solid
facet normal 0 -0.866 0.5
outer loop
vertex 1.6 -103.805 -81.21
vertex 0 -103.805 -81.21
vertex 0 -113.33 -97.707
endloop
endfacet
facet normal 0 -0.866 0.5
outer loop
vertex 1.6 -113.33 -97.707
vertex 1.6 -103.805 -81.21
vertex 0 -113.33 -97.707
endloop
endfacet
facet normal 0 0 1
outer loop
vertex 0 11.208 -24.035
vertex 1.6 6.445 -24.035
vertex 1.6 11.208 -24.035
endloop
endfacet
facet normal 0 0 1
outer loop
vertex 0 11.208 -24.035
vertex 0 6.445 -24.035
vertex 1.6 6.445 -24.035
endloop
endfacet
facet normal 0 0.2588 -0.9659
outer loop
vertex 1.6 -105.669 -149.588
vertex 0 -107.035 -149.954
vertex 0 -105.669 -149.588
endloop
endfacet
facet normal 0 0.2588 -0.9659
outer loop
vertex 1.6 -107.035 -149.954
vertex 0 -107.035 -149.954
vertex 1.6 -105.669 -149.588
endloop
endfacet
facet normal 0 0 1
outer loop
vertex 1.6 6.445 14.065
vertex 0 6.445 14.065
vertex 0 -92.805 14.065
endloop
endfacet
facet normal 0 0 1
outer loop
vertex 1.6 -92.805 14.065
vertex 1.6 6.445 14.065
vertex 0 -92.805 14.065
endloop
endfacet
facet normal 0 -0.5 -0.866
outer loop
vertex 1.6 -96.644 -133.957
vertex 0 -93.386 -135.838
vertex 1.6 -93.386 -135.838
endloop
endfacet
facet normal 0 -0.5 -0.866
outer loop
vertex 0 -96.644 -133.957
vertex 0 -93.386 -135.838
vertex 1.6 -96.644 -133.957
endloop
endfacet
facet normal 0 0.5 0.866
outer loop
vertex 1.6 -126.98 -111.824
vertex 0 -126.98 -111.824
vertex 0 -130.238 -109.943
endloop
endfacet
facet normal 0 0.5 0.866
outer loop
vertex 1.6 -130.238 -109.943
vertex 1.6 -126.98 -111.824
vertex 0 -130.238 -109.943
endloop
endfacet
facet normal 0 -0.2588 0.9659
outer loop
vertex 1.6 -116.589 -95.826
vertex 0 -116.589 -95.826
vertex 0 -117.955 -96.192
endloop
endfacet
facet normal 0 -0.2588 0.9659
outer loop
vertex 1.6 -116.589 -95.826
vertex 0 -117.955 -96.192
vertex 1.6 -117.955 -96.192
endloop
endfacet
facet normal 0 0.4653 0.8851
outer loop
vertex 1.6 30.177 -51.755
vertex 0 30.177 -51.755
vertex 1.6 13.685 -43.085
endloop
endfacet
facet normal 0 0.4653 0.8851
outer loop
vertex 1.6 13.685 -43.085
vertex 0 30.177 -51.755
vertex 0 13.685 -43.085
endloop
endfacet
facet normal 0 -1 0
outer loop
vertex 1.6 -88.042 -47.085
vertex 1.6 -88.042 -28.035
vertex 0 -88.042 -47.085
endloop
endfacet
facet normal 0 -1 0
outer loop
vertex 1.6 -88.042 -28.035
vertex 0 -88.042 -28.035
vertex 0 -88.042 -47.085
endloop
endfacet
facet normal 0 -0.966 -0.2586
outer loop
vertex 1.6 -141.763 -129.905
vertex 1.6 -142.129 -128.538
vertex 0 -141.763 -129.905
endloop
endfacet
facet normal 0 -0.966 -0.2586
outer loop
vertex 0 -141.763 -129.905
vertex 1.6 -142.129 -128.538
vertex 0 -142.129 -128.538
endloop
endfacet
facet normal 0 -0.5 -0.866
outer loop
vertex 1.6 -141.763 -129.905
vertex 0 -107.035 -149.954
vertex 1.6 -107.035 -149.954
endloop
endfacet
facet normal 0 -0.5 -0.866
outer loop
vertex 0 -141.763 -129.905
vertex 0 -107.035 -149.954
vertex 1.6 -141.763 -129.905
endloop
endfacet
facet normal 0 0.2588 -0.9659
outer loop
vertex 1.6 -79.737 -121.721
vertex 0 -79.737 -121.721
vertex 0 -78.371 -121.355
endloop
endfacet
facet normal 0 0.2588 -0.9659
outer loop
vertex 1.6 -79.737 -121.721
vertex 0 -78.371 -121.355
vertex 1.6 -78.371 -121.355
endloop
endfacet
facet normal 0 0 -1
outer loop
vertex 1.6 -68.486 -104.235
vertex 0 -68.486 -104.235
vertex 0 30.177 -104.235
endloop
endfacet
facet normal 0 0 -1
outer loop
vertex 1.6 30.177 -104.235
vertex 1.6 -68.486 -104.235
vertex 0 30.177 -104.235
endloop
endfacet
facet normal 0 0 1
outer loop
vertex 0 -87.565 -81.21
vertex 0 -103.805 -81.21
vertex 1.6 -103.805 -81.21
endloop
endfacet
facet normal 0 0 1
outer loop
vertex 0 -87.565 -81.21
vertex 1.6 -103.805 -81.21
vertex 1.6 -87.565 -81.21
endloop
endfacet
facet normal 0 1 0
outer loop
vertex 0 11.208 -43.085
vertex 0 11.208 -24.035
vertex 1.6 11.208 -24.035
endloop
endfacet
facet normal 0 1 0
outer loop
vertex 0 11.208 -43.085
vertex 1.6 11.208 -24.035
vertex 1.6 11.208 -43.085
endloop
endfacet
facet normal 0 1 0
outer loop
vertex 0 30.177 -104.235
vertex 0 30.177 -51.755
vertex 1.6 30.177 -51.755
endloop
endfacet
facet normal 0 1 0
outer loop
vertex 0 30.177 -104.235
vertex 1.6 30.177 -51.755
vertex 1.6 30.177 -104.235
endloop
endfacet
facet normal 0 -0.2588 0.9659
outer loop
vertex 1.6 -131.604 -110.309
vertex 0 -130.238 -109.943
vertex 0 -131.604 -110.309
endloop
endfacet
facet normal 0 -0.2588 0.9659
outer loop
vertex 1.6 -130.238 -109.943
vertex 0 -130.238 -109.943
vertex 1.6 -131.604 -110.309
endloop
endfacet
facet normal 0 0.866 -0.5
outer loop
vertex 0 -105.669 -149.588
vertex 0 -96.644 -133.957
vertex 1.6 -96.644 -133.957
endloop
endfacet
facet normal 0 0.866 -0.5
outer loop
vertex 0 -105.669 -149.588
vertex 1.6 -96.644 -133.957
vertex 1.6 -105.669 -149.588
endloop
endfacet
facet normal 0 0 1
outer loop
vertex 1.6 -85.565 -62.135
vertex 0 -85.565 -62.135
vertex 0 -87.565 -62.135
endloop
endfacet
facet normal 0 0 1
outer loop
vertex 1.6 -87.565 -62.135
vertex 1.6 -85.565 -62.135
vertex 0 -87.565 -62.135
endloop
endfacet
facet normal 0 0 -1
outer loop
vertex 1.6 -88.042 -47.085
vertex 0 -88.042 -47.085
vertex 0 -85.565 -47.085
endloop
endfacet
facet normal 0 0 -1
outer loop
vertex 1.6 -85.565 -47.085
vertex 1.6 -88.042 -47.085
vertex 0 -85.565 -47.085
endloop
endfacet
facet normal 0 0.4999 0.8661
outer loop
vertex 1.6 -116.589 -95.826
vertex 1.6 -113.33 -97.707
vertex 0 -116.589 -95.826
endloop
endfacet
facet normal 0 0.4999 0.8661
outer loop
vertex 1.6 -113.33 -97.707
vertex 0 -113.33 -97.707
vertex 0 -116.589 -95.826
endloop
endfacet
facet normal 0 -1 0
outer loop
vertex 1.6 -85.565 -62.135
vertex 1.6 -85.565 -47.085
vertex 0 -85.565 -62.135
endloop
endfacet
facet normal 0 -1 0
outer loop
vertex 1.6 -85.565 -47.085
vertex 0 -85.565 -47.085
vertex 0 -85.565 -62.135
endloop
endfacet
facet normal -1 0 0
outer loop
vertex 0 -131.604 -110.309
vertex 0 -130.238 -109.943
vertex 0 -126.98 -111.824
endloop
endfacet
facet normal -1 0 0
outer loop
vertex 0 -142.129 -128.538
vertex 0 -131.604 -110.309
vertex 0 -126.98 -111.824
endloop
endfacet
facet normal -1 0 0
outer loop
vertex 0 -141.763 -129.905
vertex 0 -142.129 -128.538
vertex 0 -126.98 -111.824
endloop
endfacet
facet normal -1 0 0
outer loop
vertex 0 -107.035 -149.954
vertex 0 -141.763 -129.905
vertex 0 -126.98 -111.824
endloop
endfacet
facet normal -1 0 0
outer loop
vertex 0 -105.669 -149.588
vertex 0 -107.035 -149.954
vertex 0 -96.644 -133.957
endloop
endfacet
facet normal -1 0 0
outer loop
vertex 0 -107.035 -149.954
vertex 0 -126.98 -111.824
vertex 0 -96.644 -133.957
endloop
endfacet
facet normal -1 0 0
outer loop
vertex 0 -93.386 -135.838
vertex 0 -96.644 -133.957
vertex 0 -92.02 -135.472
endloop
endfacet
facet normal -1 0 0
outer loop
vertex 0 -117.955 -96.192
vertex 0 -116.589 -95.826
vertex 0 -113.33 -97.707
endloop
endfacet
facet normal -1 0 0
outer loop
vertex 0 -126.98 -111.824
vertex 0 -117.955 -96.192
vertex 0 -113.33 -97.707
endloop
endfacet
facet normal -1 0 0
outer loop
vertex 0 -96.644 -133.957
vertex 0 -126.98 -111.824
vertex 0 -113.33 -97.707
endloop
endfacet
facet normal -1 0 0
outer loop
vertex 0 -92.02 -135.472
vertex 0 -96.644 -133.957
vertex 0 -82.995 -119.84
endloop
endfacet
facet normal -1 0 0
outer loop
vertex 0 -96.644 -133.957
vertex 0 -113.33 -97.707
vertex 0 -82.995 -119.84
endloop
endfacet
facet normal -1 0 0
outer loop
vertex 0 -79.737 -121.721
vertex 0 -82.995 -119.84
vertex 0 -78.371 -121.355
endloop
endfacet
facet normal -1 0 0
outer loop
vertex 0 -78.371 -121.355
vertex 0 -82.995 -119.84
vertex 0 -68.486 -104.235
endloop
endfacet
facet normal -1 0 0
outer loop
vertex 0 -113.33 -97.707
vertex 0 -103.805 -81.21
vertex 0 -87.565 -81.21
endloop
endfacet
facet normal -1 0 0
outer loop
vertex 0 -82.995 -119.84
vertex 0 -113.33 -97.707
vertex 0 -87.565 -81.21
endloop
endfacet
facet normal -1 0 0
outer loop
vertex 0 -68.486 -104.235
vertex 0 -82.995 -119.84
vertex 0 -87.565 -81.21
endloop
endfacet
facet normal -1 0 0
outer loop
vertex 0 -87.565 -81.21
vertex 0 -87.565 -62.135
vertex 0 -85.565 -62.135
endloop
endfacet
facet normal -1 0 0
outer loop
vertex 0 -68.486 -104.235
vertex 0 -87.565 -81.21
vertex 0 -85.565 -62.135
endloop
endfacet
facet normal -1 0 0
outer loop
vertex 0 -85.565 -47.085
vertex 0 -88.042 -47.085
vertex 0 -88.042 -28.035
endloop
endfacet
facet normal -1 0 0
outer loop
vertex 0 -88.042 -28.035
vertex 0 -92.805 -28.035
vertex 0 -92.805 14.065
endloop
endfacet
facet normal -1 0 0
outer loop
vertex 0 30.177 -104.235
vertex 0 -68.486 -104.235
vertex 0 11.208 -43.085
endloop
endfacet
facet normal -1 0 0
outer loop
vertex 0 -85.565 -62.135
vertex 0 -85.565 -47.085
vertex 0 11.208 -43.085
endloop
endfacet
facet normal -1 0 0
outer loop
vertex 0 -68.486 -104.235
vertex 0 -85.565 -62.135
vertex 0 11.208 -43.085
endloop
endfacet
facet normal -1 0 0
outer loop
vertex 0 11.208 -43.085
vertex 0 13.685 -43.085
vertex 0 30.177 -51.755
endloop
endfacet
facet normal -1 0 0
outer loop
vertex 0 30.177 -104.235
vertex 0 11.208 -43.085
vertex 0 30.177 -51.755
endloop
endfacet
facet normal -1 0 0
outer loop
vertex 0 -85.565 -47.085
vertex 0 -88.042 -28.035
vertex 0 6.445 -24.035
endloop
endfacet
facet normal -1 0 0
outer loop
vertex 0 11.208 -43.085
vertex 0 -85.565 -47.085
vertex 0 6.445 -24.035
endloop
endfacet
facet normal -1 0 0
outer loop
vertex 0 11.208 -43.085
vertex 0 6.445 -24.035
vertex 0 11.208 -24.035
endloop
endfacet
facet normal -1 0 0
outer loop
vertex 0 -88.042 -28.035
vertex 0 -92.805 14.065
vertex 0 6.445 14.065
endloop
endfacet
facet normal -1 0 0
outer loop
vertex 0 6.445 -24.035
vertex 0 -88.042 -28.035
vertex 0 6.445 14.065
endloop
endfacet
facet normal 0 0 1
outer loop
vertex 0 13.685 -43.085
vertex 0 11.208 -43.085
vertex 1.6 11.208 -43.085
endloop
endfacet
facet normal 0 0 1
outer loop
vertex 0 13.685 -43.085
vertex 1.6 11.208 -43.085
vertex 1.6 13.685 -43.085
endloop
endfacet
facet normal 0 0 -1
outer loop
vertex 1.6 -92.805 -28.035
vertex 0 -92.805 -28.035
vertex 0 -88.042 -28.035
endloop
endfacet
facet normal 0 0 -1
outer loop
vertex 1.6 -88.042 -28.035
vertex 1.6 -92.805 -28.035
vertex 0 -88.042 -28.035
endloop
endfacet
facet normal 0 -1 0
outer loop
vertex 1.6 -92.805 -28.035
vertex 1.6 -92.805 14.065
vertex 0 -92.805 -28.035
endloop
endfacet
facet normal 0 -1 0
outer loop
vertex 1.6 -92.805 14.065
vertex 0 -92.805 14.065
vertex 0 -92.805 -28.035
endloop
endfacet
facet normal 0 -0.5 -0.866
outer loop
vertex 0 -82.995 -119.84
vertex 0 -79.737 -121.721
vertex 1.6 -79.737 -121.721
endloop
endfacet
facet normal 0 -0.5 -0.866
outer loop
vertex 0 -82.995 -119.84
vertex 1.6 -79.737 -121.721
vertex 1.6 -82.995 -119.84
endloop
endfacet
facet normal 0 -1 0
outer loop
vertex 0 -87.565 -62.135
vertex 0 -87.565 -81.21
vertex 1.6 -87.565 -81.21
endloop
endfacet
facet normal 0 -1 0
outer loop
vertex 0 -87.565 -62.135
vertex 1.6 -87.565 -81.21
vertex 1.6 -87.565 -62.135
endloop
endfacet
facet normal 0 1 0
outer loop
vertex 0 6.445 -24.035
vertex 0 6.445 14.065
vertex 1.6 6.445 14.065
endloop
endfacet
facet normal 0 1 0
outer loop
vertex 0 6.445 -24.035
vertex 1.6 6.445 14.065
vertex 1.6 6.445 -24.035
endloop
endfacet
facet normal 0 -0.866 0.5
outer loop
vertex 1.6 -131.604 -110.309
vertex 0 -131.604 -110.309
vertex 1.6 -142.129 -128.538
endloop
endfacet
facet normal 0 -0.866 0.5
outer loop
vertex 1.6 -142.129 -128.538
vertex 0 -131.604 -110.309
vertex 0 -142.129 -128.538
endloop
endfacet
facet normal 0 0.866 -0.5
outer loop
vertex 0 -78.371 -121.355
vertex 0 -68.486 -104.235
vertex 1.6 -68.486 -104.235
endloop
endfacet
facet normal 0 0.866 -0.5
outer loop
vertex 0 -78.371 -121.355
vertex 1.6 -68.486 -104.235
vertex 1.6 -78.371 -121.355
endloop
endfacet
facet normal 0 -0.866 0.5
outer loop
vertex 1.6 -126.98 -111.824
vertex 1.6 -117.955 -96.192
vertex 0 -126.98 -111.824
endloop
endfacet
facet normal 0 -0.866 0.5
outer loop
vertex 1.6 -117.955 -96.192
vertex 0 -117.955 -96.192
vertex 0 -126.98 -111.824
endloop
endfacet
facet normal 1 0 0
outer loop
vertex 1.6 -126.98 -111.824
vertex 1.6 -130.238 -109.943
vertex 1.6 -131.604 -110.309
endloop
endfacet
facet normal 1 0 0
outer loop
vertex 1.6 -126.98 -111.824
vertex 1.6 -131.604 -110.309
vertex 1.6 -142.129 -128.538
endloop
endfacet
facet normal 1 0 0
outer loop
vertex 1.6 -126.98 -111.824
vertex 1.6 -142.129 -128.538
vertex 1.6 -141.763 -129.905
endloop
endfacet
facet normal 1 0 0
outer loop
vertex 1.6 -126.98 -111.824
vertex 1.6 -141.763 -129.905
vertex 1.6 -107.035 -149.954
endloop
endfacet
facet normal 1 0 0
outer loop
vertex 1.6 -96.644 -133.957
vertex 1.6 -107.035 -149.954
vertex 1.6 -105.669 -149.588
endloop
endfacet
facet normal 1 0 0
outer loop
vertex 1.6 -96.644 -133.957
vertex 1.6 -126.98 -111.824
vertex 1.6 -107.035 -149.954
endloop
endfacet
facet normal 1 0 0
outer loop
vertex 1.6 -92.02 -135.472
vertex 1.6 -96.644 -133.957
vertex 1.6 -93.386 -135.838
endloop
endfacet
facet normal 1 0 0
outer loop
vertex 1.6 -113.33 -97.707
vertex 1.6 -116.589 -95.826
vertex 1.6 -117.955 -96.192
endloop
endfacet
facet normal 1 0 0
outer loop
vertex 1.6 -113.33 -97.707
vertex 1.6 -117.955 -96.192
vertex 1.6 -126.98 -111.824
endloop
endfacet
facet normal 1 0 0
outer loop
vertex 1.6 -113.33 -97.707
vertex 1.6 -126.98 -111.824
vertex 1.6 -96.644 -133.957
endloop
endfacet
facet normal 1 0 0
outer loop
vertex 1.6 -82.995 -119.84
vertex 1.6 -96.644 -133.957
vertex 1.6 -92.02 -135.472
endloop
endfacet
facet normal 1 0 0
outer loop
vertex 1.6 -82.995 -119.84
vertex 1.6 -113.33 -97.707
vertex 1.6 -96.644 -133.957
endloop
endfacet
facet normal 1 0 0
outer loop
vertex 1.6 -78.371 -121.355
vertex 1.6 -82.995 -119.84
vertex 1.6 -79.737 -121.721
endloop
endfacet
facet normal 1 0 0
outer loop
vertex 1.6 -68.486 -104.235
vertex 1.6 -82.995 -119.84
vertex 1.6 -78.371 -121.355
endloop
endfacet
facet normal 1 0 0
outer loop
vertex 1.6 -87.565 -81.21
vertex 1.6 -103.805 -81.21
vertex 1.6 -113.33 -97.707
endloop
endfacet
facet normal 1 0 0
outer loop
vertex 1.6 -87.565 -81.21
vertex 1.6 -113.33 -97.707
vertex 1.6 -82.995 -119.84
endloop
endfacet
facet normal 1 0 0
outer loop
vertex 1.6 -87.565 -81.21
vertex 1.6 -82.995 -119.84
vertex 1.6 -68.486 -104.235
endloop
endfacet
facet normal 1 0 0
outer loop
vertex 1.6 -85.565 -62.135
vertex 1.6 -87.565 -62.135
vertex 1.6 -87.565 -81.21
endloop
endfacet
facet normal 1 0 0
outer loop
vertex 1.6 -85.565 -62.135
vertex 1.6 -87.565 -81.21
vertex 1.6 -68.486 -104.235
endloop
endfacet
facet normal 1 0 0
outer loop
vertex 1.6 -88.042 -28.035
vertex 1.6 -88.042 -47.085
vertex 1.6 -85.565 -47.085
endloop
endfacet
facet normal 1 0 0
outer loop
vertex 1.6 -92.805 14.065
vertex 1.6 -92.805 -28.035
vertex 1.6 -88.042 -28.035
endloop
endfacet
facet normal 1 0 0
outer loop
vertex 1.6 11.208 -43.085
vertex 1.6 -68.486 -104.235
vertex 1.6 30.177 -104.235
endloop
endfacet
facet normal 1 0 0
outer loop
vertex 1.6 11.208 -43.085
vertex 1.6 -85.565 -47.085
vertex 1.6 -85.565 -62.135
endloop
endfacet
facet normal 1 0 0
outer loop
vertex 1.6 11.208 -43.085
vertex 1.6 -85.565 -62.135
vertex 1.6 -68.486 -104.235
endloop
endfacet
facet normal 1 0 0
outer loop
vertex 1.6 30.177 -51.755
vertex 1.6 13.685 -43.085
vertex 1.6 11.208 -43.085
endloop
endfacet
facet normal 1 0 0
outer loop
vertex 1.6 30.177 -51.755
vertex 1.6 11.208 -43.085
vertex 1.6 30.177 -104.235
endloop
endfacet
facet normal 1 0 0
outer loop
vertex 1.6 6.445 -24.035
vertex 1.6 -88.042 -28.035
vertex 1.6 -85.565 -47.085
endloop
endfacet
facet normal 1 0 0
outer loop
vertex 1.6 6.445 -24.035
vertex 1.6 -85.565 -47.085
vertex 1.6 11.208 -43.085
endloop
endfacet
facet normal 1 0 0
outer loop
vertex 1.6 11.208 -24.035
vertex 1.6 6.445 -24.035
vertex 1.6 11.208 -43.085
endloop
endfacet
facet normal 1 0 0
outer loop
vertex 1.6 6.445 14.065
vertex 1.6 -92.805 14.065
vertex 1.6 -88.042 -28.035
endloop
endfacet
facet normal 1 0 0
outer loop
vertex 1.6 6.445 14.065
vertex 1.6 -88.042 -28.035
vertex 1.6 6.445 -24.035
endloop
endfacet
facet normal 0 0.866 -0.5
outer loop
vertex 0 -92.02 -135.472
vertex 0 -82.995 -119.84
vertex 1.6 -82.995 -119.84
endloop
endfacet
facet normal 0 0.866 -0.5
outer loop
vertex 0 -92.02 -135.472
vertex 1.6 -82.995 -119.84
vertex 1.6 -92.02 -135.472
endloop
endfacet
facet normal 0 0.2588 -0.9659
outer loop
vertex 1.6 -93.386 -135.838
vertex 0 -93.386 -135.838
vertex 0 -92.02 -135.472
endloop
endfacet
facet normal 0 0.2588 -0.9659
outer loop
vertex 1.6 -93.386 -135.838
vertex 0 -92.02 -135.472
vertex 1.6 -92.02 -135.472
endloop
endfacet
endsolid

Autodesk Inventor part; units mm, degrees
ref_plane "YZ Plane" through (0, 0, 0) normal (1, 0, 0) x (0, 1, 0)
ref_plane "XZ Plane" through (0, 0, 0) normal (0, 1, 0) x (-1, 0, 0)
ref_plane "XY Plane" through (0, 0, 0) normal (0, 0, 1) x (1, 0, 0)
sketch "Key" plane through (0, 0, 0) normal (0, 0, 1) x (1, 0, 0)
  line L0 (-9.525, 9.525) -> (9.525, 9.525) construction
  line L1 (9.525, 9.525) -> (9.525, -9.525) construction
  line L2 (9.525, -9.525) -> (-9.525, -9.525) construction
  line L3 (-9.525, -9.525) -> (-9.525, 9.525) construction
  line L4 (-9.525, 9.525) -> (9.525, -9.525) construction
  line L5 (9.525, 9.525) -> (-9.525, -9.525) construction
  point P0 (0, 0)
  point P1 (0, 0)
  dimension "d6" = 19.05
  dimension "d7" = 19.05
sketch "Col5" plane through (0, 0, 0) normal (0, 0, 1) x (1, 0, 0)
  point P0 (-10.8651, 0)
sketch "Col4" plane through (0, 0, 0) normal (0, 0, 1) x (1, 0, 0)
  point P0 (-10.8651, 0)
sketch "TC" plane through (0, 0, 0) normal (0, 0, 1) x (1, 0, 0)
  point P0 (-22.1335, 152.0917)
  dimension "d12" = 4.7625
  dimension "d13" = 4.7625
  dimension "d14" = 19.6363
sketch "Esquisse1" plane through (0, 0, 0) normal (1, 0, 0) x (0, 1, 0)
  line L0 (28.177, -71.755) -> (10.397, -71.755) construction
  line L1 (10.397, -71.755) -> (10.397, -102.235) construction
  line L2 (10.397, -102.235) -> (28.177, -102.235)
  line L3 (28.177, -102.235) -> (28.177, -71.755) construction
  line L4 (28.177, -71.755) -> (10.397, -102.235) construction
  line L5 (10.397, -71.755) -> (28.177, -102.235) construction
  line L6 (6.445, 14.065) -> (-92.805, 14.065)
  line L7 (6.445, 14.065) -> (6.445, -24.035)
  line L8 (-68.4861, -104.235) -> (30.177, -104.235)
  line L9 (30.177, -51.755) -> (30.177, -104.235)
  line L10 (-106.1694, -150.4545) -> (-142.6291, -129.4045)
  line L11 (-103.8052, -81.2096) -> (-113.3302, -97.7073)
  line L12 (-113.3302, -97.7073) -> (-117.4547, -95.3261)
  line L13 (-117.4547, -95.3261) -> (-126.9797, -111.8239)
  line L14 (-126.9797, -111.8239) -> (-131.1041, -109.4426)
  line L15 (-131.1041, -109.4426) -> (-142.6291, -129.4045)
  line L16 (-68.4861, -104.235) -> (-78.8706, -122.2214)
  line L17 (-78.8706, -122.2214) -> (-82.995, -119.8402)
  line L18 (-82.995, -119.8402) -> (-92.52, -136.338)
  line L19 (-92.52, -136.338) -> (-96.6444, -133.9567)
  line L20 (-96.6444, -133.9567) -> (-106.1694, -150.4545)
  line L21 (-92.805, 14.065) -> (-92.805, -28.035)
  line L22 (-92.805, -28.035) -> (-88.042, -28.035)
  line L23 (-88.042, -28.035) -> (-88.042, -47.085)
  line L24 (-88.042, -47.085) -> (-85.565, -47.085)
  line L25 (-85.565, -47.085) -> (-85.565, -62.135)
  line L26 (-85.565, -62.135) -> (-87.565, -62.135)
  line L27 (-89.5164, -89.4592) -> (-103.8052, -81.2096) construction
  line L28 (6.445, -24.035) -> (11.208, -24.035)
  line L29 (11.208, -24.035) -> (11.208, -43.085)
  line L30 (11.208, -43.085) -> (13.685, -43.085)
  line L31 (30.177, -51.755) -> (13.685, -43.085)
  line L32 (-78.8706, -122.2214) -> (-92.52, -136.338) construction
  line L33 (-92.52, -136.338) -> (-106.1694, -150.4545) construction
  line L34 (-103.8052, -81.2096) -> (-117.4547, -95.3261) construction
  line L35 (-131.1041, -109.4426) -> (-117.4547, -95.3261) construction
  line L36 (-103.8052, -81.2096) -> (-87.565, -81.2096)
  line L37 (-87.565, -81.2096) -> (-87.565, -62.135)
  point P0 (-5.08, 2.54)
  point P1 (19.287, -86.995)
  point P2 (-5.08, 2.54)
  point P3 (-86.042, -35.56)
  point P4 (0, 0)
extrude "Extrusion1" add sketch "Esquisse1" along normal blind 1.6
chamfer "Chanfrein5" distance 1 angle 45 6 edges at (0.8, -117.4547, -95.3261) (0.8, -131.1041, -109.4426) (0.8, -142.6291, -129.4045) (0.8, -106.1694, -150.4545) (0.8, -92.52, -136.338) (0.8, -78.8706, -122.2214)
properties part number "board-profile"
